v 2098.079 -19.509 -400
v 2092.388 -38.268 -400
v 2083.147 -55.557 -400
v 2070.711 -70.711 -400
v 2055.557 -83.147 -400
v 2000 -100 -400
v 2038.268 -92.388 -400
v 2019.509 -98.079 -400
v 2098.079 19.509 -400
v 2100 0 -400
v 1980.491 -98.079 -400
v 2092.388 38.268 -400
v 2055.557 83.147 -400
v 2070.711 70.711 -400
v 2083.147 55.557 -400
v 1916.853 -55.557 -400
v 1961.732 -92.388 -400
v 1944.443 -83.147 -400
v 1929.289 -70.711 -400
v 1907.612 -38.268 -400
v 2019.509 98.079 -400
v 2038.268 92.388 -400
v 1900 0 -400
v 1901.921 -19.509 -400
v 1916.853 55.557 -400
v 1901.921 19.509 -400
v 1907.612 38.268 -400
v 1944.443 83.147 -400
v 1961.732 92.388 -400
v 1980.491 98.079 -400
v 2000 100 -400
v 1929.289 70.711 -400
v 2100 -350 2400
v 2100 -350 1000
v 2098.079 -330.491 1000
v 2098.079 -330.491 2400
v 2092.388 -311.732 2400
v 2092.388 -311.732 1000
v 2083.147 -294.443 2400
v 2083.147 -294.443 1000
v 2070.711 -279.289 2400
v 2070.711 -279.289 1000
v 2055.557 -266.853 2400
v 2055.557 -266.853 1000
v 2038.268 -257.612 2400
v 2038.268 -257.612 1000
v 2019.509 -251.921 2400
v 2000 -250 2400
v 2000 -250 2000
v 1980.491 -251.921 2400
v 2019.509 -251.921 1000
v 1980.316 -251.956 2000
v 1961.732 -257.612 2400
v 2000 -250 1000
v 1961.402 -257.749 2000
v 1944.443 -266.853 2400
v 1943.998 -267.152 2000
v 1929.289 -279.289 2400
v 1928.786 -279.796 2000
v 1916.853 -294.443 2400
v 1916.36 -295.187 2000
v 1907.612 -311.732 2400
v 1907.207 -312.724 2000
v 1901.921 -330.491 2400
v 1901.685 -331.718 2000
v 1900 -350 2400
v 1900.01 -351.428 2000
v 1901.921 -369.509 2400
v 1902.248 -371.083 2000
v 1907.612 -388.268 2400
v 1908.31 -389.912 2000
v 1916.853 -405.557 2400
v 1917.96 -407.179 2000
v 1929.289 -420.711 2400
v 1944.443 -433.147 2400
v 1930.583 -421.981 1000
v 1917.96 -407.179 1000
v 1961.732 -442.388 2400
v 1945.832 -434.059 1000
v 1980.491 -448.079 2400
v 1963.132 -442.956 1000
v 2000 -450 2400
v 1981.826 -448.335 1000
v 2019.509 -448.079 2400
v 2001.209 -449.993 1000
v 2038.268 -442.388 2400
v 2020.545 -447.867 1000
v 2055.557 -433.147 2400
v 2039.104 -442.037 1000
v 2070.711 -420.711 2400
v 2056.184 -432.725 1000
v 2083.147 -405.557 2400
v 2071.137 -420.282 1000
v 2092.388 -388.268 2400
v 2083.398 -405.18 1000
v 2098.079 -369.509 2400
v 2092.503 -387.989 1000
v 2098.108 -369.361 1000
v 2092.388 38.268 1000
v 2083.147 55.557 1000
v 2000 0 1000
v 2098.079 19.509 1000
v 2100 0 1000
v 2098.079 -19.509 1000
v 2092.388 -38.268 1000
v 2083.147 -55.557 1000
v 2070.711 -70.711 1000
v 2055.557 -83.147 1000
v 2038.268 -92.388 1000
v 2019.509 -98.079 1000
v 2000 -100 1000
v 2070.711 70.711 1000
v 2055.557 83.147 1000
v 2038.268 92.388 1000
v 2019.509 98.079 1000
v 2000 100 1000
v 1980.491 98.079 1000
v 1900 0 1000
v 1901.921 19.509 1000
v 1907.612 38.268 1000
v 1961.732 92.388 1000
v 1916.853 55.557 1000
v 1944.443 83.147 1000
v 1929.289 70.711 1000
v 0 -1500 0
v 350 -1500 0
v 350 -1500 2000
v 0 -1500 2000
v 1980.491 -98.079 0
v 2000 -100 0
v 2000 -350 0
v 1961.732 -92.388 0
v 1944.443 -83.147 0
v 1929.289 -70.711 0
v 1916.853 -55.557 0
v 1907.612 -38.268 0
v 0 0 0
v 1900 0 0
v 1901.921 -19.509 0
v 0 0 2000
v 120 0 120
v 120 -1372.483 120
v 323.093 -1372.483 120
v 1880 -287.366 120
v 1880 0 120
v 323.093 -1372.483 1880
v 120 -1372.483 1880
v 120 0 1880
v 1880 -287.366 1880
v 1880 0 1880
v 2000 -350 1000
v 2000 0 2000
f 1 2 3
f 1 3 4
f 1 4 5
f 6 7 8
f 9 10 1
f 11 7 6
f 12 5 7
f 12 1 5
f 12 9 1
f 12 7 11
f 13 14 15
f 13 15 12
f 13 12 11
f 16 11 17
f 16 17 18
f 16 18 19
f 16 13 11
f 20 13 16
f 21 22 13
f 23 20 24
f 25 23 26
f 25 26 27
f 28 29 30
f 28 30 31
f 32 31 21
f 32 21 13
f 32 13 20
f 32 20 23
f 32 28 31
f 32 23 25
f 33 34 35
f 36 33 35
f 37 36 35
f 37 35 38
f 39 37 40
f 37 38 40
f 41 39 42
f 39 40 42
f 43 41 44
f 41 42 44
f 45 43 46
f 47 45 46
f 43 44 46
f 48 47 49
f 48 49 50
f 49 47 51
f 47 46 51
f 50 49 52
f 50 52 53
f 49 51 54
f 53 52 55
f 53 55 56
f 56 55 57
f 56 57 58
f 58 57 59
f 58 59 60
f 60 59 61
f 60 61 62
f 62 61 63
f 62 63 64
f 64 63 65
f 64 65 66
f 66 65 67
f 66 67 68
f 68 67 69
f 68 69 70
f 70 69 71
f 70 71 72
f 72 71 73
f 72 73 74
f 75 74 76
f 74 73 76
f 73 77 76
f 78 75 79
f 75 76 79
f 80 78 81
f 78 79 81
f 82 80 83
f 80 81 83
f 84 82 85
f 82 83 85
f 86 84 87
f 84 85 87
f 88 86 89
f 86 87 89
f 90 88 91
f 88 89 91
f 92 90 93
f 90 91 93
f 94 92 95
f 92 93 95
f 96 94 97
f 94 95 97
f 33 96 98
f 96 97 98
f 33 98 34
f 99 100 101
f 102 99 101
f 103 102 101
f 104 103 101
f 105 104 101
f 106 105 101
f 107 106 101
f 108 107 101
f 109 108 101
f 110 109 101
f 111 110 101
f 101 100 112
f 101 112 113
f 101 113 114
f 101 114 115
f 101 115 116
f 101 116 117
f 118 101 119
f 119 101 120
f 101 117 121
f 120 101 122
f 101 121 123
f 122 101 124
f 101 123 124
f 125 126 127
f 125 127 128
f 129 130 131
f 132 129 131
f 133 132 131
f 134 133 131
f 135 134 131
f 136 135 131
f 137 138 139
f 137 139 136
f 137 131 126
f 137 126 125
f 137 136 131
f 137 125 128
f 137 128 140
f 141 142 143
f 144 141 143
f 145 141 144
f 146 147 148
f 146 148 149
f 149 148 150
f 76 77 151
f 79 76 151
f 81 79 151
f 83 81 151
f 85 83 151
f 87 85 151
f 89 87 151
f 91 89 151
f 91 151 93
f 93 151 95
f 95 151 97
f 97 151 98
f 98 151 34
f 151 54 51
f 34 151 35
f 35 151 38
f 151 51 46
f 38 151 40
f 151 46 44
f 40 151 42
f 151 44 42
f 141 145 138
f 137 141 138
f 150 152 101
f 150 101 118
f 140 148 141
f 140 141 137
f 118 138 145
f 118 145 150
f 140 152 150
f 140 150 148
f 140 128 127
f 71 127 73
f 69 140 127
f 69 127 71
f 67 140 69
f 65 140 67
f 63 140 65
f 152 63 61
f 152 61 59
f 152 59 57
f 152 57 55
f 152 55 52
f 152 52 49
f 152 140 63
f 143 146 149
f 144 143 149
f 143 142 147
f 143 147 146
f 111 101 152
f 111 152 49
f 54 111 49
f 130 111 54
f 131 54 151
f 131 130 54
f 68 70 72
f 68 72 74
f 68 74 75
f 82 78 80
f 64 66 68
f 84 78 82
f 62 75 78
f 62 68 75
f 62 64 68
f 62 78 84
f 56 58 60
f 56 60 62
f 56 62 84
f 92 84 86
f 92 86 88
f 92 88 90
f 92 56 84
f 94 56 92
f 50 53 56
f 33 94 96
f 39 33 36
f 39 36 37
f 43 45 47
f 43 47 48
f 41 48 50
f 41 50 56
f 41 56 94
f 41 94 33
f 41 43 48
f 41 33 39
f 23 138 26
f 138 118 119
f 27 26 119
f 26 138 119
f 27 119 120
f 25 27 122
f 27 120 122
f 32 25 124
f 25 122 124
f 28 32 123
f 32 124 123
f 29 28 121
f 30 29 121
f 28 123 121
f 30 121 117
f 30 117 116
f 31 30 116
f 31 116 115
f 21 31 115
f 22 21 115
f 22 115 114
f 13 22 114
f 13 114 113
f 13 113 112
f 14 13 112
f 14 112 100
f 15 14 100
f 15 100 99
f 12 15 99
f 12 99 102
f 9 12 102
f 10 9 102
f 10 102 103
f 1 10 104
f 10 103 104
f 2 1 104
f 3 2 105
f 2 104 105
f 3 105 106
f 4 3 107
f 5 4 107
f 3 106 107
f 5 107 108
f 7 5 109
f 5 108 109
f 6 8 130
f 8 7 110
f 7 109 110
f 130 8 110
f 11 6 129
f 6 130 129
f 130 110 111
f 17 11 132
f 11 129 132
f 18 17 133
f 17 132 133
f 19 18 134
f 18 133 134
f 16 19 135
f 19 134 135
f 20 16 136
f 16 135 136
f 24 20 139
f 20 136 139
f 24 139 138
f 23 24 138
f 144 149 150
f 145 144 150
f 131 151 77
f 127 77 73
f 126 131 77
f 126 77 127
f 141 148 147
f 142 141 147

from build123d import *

# Parameters (mm, degrees)
BOSS_EXTRUDE1_DEPTH      = 2000
CUT_EXTRUDE1_DEPTH       = 1880
BOSS_EXTRUDE2_DEPTH      = 120
BOSS_EXTRUDE3_DEPTH      = 400
BOSS_EXTRUDE3_DEPTH_BACK = 1000
SKETCH6_R                = 100
BOSS_EXTRUDE4_DEPTH      = 400
BOSS_EXTRUDE4_DEPTH_BACK = 1000
SKETCH7_R                = 100


with BuildPart() as part:
    # Sketch3 → Boss-Extrude1 (new body)
    with BuildSketch(Plane.XY):
        Polygon((0, 0), (2000, 0), (2000, -350), (350, -1500), (0, -1500), align=None)
    extrude(amount=BOSS_EXTRUDE1_DEPTH)

    # Sketch4 → Cut-Extrude1 (cut)
    with BuildSketch(Plane.XY.offset(2000)):
        Polygon((120, 0), (120, -1372.482987962), (323.092909156, -1372.482987962), (1880, -287.365924646), (1880, -109.214006034), (1880, 0), align=None)
    extrude(amount=-CUT_EXTRUDE1_DEPTH, mode=Mode.SUBTRACT)

    # Sketch5 → Boss-Extrude2 (add)
    with BuildSketch(Plane.XY.offset(2000)):
        Polygon((120, 0), (120, -1372.482987962), (323.092909156, -1372.482987962), (1880, -287.365924646), (1880, 0), align=None)
    extrude(amount=-BOSS_EXTRUDE2_DEPTH)

    # Sketch6 → Boss-Extrude3 (add, two sides: drawn at the far end of the back side and taken through both)
    with BuildSketch(Plane(origin=(0, 0, 0), x_dir=(-1, 0, 0), z_dir=(0, 0, -1)).offset(-BOSS_EXTRUDE3_DEPTH_BACK)):
        with Locations((-2000, 0)):
            Circle(SKETCH6_R)
    extrude(amount=BOSS_EXTRUDE3_DEPTH + BOSS_EXTRUDE3_DEPTH_BACK)

    # Sketch7 → Boss-Extrude4 (add, two sides: drawn at the far end of the back side and taken through both)
    with BuildSketch(Plane.XY.offset(2000).offset(-BOSS_EXTRUDE4_DEPTH_BACK)):
        with Locations((2000, -350)):
            Circle(SKETCH7_R)
    extrude(amount=BOSS_EXTRUDE4_DEPTH + BOSS_EXTRUDE4_DEPTH_BACK)


solid = part.part
